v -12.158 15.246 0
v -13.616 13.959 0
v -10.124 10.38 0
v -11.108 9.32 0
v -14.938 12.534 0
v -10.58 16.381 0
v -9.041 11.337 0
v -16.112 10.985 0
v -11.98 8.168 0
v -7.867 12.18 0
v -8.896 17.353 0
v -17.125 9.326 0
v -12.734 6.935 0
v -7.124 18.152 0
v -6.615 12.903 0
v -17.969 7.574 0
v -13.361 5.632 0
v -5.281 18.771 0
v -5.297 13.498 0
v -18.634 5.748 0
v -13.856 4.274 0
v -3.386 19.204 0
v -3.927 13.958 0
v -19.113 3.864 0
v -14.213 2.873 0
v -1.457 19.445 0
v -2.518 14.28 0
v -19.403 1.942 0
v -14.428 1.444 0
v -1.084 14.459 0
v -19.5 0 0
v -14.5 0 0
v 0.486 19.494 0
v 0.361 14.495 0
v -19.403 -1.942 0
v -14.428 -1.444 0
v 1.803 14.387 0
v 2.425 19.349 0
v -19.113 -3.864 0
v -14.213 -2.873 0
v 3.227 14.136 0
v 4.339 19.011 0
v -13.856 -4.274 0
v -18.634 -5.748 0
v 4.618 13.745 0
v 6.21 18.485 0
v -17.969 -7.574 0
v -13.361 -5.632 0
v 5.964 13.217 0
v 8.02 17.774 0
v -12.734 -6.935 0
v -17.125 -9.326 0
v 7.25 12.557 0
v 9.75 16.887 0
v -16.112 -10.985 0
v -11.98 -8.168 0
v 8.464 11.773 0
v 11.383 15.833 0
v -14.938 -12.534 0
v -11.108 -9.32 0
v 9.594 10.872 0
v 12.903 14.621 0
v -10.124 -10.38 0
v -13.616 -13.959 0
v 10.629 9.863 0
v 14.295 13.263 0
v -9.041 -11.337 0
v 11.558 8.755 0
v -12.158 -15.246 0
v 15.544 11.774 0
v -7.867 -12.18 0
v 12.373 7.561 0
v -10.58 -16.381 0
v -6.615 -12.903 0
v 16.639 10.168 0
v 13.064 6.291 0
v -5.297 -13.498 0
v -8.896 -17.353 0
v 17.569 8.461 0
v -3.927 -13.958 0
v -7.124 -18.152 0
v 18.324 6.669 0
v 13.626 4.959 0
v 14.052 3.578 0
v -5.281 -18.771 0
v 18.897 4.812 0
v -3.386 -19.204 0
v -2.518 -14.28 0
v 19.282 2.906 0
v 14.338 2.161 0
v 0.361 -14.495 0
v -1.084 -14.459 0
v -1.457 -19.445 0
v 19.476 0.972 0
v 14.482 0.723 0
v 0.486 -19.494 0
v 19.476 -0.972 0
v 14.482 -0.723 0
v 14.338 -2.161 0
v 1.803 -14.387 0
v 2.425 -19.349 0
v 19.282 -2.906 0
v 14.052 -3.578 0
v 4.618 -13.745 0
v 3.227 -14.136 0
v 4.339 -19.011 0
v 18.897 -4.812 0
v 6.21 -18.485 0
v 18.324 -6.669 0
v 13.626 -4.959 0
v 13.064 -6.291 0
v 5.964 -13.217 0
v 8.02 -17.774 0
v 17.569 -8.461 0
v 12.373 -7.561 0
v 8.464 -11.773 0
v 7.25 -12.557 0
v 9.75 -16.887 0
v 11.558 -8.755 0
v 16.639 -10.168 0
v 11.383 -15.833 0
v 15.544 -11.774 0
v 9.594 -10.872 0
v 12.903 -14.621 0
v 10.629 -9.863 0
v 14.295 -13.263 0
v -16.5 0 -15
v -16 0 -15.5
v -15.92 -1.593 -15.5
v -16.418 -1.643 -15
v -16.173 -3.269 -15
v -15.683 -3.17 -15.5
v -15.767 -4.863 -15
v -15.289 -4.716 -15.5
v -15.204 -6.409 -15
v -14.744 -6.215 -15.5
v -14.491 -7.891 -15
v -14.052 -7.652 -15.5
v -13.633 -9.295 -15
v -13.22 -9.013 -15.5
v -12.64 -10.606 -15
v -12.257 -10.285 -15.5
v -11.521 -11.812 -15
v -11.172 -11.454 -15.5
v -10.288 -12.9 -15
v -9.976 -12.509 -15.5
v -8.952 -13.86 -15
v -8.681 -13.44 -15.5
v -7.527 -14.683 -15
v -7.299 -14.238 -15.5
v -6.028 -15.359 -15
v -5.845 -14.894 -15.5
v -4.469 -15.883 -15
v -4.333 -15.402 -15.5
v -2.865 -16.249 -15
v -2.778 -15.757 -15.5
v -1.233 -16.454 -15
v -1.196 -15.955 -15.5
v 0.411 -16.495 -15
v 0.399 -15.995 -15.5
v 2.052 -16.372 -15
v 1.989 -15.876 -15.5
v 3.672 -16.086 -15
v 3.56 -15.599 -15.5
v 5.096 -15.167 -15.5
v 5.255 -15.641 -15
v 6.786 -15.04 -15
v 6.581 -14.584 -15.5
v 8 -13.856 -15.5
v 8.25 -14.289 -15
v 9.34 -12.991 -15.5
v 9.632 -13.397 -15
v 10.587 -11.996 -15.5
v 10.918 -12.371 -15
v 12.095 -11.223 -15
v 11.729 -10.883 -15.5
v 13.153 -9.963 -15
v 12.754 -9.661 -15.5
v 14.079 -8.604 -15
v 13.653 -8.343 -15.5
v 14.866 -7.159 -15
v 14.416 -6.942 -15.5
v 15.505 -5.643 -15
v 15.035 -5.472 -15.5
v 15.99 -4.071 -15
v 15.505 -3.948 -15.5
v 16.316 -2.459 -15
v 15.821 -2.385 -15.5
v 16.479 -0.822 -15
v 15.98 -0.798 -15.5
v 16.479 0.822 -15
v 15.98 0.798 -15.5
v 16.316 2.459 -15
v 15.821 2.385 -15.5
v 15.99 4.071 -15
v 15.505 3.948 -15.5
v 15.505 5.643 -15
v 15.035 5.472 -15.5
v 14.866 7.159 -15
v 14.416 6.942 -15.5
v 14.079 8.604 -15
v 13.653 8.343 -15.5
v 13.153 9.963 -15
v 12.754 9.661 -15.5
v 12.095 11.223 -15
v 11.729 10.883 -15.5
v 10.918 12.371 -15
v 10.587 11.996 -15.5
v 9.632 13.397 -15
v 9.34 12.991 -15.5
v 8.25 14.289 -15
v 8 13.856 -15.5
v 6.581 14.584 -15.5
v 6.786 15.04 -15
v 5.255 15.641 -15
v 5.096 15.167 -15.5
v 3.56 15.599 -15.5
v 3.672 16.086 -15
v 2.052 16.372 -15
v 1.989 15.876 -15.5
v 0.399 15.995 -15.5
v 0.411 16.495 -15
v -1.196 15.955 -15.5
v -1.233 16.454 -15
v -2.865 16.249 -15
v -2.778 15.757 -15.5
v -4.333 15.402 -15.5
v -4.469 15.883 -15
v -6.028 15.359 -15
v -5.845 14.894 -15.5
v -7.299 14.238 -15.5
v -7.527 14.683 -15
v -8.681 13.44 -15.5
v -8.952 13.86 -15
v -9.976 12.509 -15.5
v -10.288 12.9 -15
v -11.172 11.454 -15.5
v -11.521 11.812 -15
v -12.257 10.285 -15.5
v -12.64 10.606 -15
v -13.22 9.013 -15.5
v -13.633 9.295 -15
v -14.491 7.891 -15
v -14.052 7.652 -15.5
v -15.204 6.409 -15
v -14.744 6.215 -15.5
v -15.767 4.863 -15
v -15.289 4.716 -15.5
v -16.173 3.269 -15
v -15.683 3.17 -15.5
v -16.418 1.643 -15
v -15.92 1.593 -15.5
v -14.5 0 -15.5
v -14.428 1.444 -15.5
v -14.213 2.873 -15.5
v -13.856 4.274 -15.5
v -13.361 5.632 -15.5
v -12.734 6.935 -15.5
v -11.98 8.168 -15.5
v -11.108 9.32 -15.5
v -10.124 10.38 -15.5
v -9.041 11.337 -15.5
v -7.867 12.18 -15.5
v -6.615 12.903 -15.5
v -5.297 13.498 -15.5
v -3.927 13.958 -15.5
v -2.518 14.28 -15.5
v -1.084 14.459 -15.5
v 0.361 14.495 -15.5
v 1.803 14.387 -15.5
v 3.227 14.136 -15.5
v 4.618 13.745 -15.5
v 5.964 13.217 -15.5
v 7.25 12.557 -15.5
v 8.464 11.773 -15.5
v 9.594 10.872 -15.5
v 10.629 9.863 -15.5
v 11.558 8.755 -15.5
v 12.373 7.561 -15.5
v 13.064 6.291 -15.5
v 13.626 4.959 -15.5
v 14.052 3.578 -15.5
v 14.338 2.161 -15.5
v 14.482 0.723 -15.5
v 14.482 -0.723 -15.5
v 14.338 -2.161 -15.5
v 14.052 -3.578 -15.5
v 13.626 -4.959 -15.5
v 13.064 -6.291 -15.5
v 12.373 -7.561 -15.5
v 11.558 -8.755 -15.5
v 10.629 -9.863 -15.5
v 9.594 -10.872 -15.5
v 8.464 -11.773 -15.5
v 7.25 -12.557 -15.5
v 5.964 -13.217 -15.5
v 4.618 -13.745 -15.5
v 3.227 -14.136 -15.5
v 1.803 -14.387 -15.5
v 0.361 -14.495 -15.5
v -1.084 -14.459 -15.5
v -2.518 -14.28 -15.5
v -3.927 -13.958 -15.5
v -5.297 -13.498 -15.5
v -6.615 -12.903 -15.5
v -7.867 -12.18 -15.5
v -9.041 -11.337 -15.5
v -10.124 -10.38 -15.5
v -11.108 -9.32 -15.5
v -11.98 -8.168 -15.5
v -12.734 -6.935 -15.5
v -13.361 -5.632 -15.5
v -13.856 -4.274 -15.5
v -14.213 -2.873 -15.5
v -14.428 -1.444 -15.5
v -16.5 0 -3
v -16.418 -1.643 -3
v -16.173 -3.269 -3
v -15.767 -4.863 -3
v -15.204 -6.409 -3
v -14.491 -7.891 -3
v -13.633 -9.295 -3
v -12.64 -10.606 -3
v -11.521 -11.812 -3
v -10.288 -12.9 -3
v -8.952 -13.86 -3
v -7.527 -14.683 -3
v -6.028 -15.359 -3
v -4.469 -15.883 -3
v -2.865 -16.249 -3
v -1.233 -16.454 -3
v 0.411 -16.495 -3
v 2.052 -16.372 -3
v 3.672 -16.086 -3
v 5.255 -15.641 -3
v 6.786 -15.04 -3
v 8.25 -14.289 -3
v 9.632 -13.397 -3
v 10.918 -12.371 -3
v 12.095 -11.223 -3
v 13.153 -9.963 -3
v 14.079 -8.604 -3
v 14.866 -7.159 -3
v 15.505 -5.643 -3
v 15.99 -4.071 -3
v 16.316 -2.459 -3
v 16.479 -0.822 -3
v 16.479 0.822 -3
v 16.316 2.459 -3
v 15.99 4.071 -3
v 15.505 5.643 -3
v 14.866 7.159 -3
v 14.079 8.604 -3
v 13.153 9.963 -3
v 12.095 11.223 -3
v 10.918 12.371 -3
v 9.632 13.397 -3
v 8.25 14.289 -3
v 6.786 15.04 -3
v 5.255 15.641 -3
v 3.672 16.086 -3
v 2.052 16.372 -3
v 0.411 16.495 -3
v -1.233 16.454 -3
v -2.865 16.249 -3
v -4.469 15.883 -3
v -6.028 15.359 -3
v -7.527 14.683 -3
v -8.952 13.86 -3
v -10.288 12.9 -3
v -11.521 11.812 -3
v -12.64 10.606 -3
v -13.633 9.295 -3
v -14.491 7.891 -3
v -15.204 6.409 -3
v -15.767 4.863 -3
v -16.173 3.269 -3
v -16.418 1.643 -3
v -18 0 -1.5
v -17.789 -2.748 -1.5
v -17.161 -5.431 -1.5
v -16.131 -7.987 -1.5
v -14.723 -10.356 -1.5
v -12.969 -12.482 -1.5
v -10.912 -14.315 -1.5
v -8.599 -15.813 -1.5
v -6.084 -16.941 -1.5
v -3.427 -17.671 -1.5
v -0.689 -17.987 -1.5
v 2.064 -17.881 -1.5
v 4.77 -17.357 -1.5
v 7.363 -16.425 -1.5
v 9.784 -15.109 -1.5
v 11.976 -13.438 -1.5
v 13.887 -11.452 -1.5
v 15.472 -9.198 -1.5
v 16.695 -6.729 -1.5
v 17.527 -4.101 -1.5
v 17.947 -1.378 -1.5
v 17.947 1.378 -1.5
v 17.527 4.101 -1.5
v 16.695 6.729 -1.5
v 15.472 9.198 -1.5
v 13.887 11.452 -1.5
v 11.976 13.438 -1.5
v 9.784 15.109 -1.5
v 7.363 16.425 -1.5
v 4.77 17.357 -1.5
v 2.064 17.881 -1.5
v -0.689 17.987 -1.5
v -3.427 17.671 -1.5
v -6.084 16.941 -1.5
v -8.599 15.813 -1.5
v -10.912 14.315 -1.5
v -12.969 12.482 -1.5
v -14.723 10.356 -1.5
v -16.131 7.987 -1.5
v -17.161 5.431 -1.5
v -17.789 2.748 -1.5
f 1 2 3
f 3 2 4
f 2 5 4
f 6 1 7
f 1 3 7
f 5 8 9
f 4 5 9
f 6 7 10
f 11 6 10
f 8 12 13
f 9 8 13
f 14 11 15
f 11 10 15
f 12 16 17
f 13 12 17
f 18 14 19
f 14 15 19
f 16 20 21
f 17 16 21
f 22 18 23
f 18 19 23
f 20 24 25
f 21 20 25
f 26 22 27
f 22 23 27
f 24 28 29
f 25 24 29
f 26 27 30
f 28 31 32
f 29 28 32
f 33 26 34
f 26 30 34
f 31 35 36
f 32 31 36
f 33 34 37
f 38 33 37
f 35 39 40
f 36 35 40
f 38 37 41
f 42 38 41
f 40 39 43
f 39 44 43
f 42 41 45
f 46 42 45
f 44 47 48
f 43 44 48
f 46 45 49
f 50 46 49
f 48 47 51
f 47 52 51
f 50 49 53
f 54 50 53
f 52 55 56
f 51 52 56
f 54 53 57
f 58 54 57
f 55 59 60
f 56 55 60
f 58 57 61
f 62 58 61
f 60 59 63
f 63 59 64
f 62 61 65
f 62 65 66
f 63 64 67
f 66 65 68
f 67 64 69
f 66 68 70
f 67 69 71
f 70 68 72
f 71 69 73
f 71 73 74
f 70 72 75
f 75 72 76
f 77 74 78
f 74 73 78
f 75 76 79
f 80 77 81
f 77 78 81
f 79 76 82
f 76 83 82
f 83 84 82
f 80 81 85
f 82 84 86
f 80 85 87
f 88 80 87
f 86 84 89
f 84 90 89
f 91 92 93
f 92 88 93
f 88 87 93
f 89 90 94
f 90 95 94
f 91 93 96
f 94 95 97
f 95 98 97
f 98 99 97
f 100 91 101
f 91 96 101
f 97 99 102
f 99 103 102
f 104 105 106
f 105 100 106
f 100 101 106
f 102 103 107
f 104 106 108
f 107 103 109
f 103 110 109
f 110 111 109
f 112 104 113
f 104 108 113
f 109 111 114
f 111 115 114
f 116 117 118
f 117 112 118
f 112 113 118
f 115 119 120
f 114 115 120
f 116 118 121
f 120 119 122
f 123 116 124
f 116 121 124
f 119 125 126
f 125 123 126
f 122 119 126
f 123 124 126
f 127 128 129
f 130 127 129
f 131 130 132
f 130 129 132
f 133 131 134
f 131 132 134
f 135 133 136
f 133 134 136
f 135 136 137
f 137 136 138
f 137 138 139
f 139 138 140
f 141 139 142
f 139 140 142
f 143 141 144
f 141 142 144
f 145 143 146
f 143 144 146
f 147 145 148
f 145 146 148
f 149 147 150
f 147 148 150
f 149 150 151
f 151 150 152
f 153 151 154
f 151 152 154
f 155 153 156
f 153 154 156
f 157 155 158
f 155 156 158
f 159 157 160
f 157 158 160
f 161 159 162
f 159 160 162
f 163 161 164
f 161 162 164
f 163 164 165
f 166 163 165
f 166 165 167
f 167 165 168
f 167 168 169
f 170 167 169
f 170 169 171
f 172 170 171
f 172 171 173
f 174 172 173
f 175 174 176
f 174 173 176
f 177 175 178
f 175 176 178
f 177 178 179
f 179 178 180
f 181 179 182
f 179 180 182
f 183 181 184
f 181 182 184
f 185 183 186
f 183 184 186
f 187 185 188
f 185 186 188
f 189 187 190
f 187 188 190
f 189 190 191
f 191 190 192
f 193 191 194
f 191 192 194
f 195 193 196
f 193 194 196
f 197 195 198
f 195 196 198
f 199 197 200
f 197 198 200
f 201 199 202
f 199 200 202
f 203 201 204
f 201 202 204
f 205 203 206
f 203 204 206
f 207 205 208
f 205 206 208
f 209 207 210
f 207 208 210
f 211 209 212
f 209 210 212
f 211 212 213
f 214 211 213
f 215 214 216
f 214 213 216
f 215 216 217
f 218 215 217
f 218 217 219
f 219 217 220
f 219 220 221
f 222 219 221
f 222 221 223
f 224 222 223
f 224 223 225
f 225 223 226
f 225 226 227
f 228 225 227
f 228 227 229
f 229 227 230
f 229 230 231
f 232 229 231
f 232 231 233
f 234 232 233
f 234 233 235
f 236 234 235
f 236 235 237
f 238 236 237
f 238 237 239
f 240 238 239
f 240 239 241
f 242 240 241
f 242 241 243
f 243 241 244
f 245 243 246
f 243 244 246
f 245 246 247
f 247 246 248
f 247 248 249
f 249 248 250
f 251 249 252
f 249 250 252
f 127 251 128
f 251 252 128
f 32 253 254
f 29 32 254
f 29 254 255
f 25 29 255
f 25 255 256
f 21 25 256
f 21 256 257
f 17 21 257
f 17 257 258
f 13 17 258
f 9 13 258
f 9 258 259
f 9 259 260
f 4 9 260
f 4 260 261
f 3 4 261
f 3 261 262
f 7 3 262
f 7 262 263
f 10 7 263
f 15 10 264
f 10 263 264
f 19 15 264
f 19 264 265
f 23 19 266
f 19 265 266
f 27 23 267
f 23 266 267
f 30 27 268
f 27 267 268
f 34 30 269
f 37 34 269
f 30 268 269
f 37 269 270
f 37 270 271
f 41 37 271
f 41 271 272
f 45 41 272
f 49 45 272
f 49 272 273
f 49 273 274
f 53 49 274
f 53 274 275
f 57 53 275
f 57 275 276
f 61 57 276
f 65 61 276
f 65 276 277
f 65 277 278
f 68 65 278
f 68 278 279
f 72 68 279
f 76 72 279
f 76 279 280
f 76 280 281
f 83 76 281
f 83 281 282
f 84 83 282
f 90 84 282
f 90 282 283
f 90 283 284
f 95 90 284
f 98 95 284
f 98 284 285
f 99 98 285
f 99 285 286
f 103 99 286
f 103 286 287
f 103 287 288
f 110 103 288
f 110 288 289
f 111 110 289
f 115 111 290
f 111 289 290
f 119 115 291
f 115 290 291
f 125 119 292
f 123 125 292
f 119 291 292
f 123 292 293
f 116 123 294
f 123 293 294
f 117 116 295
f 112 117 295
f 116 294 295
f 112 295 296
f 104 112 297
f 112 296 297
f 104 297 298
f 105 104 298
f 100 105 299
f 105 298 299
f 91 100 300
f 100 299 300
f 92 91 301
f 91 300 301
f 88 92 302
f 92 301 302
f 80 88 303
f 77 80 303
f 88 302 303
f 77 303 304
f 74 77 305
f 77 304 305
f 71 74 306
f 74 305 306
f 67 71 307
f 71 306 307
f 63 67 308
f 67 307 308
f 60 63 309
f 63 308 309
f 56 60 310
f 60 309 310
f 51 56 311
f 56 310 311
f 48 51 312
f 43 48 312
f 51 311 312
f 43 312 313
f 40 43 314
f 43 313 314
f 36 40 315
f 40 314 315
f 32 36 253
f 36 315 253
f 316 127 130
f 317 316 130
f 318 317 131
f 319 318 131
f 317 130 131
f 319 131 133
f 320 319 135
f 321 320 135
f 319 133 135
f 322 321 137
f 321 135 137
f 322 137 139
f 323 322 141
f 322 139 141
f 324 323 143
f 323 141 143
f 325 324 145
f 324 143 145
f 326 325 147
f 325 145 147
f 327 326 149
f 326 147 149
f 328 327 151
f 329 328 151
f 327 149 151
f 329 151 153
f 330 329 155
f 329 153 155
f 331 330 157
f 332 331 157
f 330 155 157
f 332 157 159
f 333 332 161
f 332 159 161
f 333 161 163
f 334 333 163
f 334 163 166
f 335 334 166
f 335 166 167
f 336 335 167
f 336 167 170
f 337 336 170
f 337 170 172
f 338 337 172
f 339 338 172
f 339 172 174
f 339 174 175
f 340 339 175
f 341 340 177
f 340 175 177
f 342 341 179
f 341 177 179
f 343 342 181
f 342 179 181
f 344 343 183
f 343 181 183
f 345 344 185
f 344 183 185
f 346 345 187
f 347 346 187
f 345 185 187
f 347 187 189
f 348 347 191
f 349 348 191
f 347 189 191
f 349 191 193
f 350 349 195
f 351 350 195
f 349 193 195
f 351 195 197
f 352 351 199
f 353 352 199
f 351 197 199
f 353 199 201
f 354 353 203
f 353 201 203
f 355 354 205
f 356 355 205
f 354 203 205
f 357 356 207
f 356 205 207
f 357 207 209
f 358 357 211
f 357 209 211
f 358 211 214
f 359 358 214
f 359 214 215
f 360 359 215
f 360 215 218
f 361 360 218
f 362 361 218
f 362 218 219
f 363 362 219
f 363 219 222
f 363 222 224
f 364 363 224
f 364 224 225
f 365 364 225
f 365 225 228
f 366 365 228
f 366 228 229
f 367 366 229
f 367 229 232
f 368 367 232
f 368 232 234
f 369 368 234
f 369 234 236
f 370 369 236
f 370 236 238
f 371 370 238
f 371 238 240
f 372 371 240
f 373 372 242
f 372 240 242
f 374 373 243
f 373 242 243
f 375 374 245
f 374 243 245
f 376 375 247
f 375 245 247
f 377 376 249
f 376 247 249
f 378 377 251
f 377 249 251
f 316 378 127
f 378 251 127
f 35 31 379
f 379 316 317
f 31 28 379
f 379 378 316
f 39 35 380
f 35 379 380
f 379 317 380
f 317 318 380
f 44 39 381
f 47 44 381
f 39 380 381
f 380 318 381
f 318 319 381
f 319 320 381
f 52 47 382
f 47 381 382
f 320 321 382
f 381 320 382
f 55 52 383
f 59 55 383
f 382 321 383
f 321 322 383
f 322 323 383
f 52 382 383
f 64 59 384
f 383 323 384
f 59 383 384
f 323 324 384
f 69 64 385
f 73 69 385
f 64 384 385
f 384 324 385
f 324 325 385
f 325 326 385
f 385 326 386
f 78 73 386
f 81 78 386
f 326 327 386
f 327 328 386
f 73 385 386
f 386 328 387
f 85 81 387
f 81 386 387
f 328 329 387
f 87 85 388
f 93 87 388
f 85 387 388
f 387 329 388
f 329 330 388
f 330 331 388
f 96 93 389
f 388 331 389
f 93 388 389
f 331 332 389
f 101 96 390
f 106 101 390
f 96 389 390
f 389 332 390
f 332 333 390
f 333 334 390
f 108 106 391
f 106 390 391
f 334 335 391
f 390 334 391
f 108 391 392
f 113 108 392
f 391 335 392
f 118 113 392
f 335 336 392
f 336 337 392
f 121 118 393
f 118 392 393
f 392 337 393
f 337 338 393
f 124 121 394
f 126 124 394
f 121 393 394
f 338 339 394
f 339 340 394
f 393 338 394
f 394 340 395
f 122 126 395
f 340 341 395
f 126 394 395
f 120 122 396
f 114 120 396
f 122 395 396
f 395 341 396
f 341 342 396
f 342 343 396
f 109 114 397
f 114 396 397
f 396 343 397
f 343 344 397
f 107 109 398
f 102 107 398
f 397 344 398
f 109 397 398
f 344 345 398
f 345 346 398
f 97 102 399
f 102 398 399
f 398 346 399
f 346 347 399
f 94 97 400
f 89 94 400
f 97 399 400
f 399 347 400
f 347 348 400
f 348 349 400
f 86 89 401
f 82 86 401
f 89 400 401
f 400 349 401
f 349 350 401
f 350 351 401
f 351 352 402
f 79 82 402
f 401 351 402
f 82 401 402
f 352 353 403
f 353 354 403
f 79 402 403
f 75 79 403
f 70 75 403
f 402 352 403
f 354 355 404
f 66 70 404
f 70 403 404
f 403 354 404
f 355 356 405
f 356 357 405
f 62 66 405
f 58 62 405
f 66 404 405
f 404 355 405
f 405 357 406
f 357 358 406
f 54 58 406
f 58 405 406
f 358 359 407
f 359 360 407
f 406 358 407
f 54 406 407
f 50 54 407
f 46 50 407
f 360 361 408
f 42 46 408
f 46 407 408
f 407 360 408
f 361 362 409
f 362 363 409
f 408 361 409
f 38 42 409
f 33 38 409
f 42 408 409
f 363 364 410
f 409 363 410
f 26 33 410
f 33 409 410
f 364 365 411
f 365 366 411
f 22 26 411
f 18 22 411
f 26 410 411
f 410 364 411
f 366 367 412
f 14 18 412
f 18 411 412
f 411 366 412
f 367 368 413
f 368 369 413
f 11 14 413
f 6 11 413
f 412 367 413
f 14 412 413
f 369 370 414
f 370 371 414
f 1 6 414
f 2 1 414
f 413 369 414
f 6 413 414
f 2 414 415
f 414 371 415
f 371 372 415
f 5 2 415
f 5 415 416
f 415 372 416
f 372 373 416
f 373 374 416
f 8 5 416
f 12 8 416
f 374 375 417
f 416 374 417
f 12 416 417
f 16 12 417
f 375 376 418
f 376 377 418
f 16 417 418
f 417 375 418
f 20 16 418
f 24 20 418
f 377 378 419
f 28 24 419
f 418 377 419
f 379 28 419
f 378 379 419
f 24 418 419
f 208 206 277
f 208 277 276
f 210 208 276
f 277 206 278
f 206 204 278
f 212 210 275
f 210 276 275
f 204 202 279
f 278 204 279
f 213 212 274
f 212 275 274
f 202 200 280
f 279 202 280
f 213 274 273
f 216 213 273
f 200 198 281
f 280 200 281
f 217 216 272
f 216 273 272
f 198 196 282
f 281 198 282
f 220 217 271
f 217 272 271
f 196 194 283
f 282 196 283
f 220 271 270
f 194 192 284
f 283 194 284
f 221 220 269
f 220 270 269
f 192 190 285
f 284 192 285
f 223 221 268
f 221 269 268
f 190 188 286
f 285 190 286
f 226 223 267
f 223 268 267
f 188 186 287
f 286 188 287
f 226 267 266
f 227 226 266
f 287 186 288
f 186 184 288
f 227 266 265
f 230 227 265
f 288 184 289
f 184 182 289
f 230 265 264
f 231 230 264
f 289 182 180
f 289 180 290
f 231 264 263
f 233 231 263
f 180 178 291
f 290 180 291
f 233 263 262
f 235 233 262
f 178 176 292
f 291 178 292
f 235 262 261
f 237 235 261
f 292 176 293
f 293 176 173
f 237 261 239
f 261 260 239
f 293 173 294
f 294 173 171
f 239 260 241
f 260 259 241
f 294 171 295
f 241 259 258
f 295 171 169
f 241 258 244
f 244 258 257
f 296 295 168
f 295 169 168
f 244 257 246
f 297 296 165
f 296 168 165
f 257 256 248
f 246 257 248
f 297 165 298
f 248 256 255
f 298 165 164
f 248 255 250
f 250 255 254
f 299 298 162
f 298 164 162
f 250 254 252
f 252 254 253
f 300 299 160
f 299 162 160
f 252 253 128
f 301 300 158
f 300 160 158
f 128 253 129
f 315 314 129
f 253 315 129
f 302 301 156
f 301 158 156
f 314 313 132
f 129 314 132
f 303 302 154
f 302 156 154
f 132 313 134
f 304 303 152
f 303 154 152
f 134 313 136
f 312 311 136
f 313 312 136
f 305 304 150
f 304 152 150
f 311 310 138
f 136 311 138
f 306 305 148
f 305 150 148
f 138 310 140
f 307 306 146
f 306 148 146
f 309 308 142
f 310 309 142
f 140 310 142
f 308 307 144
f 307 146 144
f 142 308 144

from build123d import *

# Parameters (mm, degrees)
F3_D    = 29
F4_SIZE = 0.5


with BuildPart() as f1:
    # F0 (on Front) → F1 (revolve)
    with BuildSketch(Plane.XZ):
        Polygon((0, -15.5), (0, 0), (-19.5, 0), (-16.5, -3), (-16.5, -15.5), align=None)
    revolve(axis=Axis((0, 0, -7.75), (0, 0, 1)))

    # F3 (through all)
    with Locations(Plane.XY):
        with Locations((0, 0)):
            Hole(F3_D / 2)

    # F4
    f4_edges = [f1.edges().sort_by_distance(p)[0] for p in [
        (16.5, 0, -15.5),
    ]]
    chamfer(f4_edges, length=F4_SIZE)


solid = f1.part
